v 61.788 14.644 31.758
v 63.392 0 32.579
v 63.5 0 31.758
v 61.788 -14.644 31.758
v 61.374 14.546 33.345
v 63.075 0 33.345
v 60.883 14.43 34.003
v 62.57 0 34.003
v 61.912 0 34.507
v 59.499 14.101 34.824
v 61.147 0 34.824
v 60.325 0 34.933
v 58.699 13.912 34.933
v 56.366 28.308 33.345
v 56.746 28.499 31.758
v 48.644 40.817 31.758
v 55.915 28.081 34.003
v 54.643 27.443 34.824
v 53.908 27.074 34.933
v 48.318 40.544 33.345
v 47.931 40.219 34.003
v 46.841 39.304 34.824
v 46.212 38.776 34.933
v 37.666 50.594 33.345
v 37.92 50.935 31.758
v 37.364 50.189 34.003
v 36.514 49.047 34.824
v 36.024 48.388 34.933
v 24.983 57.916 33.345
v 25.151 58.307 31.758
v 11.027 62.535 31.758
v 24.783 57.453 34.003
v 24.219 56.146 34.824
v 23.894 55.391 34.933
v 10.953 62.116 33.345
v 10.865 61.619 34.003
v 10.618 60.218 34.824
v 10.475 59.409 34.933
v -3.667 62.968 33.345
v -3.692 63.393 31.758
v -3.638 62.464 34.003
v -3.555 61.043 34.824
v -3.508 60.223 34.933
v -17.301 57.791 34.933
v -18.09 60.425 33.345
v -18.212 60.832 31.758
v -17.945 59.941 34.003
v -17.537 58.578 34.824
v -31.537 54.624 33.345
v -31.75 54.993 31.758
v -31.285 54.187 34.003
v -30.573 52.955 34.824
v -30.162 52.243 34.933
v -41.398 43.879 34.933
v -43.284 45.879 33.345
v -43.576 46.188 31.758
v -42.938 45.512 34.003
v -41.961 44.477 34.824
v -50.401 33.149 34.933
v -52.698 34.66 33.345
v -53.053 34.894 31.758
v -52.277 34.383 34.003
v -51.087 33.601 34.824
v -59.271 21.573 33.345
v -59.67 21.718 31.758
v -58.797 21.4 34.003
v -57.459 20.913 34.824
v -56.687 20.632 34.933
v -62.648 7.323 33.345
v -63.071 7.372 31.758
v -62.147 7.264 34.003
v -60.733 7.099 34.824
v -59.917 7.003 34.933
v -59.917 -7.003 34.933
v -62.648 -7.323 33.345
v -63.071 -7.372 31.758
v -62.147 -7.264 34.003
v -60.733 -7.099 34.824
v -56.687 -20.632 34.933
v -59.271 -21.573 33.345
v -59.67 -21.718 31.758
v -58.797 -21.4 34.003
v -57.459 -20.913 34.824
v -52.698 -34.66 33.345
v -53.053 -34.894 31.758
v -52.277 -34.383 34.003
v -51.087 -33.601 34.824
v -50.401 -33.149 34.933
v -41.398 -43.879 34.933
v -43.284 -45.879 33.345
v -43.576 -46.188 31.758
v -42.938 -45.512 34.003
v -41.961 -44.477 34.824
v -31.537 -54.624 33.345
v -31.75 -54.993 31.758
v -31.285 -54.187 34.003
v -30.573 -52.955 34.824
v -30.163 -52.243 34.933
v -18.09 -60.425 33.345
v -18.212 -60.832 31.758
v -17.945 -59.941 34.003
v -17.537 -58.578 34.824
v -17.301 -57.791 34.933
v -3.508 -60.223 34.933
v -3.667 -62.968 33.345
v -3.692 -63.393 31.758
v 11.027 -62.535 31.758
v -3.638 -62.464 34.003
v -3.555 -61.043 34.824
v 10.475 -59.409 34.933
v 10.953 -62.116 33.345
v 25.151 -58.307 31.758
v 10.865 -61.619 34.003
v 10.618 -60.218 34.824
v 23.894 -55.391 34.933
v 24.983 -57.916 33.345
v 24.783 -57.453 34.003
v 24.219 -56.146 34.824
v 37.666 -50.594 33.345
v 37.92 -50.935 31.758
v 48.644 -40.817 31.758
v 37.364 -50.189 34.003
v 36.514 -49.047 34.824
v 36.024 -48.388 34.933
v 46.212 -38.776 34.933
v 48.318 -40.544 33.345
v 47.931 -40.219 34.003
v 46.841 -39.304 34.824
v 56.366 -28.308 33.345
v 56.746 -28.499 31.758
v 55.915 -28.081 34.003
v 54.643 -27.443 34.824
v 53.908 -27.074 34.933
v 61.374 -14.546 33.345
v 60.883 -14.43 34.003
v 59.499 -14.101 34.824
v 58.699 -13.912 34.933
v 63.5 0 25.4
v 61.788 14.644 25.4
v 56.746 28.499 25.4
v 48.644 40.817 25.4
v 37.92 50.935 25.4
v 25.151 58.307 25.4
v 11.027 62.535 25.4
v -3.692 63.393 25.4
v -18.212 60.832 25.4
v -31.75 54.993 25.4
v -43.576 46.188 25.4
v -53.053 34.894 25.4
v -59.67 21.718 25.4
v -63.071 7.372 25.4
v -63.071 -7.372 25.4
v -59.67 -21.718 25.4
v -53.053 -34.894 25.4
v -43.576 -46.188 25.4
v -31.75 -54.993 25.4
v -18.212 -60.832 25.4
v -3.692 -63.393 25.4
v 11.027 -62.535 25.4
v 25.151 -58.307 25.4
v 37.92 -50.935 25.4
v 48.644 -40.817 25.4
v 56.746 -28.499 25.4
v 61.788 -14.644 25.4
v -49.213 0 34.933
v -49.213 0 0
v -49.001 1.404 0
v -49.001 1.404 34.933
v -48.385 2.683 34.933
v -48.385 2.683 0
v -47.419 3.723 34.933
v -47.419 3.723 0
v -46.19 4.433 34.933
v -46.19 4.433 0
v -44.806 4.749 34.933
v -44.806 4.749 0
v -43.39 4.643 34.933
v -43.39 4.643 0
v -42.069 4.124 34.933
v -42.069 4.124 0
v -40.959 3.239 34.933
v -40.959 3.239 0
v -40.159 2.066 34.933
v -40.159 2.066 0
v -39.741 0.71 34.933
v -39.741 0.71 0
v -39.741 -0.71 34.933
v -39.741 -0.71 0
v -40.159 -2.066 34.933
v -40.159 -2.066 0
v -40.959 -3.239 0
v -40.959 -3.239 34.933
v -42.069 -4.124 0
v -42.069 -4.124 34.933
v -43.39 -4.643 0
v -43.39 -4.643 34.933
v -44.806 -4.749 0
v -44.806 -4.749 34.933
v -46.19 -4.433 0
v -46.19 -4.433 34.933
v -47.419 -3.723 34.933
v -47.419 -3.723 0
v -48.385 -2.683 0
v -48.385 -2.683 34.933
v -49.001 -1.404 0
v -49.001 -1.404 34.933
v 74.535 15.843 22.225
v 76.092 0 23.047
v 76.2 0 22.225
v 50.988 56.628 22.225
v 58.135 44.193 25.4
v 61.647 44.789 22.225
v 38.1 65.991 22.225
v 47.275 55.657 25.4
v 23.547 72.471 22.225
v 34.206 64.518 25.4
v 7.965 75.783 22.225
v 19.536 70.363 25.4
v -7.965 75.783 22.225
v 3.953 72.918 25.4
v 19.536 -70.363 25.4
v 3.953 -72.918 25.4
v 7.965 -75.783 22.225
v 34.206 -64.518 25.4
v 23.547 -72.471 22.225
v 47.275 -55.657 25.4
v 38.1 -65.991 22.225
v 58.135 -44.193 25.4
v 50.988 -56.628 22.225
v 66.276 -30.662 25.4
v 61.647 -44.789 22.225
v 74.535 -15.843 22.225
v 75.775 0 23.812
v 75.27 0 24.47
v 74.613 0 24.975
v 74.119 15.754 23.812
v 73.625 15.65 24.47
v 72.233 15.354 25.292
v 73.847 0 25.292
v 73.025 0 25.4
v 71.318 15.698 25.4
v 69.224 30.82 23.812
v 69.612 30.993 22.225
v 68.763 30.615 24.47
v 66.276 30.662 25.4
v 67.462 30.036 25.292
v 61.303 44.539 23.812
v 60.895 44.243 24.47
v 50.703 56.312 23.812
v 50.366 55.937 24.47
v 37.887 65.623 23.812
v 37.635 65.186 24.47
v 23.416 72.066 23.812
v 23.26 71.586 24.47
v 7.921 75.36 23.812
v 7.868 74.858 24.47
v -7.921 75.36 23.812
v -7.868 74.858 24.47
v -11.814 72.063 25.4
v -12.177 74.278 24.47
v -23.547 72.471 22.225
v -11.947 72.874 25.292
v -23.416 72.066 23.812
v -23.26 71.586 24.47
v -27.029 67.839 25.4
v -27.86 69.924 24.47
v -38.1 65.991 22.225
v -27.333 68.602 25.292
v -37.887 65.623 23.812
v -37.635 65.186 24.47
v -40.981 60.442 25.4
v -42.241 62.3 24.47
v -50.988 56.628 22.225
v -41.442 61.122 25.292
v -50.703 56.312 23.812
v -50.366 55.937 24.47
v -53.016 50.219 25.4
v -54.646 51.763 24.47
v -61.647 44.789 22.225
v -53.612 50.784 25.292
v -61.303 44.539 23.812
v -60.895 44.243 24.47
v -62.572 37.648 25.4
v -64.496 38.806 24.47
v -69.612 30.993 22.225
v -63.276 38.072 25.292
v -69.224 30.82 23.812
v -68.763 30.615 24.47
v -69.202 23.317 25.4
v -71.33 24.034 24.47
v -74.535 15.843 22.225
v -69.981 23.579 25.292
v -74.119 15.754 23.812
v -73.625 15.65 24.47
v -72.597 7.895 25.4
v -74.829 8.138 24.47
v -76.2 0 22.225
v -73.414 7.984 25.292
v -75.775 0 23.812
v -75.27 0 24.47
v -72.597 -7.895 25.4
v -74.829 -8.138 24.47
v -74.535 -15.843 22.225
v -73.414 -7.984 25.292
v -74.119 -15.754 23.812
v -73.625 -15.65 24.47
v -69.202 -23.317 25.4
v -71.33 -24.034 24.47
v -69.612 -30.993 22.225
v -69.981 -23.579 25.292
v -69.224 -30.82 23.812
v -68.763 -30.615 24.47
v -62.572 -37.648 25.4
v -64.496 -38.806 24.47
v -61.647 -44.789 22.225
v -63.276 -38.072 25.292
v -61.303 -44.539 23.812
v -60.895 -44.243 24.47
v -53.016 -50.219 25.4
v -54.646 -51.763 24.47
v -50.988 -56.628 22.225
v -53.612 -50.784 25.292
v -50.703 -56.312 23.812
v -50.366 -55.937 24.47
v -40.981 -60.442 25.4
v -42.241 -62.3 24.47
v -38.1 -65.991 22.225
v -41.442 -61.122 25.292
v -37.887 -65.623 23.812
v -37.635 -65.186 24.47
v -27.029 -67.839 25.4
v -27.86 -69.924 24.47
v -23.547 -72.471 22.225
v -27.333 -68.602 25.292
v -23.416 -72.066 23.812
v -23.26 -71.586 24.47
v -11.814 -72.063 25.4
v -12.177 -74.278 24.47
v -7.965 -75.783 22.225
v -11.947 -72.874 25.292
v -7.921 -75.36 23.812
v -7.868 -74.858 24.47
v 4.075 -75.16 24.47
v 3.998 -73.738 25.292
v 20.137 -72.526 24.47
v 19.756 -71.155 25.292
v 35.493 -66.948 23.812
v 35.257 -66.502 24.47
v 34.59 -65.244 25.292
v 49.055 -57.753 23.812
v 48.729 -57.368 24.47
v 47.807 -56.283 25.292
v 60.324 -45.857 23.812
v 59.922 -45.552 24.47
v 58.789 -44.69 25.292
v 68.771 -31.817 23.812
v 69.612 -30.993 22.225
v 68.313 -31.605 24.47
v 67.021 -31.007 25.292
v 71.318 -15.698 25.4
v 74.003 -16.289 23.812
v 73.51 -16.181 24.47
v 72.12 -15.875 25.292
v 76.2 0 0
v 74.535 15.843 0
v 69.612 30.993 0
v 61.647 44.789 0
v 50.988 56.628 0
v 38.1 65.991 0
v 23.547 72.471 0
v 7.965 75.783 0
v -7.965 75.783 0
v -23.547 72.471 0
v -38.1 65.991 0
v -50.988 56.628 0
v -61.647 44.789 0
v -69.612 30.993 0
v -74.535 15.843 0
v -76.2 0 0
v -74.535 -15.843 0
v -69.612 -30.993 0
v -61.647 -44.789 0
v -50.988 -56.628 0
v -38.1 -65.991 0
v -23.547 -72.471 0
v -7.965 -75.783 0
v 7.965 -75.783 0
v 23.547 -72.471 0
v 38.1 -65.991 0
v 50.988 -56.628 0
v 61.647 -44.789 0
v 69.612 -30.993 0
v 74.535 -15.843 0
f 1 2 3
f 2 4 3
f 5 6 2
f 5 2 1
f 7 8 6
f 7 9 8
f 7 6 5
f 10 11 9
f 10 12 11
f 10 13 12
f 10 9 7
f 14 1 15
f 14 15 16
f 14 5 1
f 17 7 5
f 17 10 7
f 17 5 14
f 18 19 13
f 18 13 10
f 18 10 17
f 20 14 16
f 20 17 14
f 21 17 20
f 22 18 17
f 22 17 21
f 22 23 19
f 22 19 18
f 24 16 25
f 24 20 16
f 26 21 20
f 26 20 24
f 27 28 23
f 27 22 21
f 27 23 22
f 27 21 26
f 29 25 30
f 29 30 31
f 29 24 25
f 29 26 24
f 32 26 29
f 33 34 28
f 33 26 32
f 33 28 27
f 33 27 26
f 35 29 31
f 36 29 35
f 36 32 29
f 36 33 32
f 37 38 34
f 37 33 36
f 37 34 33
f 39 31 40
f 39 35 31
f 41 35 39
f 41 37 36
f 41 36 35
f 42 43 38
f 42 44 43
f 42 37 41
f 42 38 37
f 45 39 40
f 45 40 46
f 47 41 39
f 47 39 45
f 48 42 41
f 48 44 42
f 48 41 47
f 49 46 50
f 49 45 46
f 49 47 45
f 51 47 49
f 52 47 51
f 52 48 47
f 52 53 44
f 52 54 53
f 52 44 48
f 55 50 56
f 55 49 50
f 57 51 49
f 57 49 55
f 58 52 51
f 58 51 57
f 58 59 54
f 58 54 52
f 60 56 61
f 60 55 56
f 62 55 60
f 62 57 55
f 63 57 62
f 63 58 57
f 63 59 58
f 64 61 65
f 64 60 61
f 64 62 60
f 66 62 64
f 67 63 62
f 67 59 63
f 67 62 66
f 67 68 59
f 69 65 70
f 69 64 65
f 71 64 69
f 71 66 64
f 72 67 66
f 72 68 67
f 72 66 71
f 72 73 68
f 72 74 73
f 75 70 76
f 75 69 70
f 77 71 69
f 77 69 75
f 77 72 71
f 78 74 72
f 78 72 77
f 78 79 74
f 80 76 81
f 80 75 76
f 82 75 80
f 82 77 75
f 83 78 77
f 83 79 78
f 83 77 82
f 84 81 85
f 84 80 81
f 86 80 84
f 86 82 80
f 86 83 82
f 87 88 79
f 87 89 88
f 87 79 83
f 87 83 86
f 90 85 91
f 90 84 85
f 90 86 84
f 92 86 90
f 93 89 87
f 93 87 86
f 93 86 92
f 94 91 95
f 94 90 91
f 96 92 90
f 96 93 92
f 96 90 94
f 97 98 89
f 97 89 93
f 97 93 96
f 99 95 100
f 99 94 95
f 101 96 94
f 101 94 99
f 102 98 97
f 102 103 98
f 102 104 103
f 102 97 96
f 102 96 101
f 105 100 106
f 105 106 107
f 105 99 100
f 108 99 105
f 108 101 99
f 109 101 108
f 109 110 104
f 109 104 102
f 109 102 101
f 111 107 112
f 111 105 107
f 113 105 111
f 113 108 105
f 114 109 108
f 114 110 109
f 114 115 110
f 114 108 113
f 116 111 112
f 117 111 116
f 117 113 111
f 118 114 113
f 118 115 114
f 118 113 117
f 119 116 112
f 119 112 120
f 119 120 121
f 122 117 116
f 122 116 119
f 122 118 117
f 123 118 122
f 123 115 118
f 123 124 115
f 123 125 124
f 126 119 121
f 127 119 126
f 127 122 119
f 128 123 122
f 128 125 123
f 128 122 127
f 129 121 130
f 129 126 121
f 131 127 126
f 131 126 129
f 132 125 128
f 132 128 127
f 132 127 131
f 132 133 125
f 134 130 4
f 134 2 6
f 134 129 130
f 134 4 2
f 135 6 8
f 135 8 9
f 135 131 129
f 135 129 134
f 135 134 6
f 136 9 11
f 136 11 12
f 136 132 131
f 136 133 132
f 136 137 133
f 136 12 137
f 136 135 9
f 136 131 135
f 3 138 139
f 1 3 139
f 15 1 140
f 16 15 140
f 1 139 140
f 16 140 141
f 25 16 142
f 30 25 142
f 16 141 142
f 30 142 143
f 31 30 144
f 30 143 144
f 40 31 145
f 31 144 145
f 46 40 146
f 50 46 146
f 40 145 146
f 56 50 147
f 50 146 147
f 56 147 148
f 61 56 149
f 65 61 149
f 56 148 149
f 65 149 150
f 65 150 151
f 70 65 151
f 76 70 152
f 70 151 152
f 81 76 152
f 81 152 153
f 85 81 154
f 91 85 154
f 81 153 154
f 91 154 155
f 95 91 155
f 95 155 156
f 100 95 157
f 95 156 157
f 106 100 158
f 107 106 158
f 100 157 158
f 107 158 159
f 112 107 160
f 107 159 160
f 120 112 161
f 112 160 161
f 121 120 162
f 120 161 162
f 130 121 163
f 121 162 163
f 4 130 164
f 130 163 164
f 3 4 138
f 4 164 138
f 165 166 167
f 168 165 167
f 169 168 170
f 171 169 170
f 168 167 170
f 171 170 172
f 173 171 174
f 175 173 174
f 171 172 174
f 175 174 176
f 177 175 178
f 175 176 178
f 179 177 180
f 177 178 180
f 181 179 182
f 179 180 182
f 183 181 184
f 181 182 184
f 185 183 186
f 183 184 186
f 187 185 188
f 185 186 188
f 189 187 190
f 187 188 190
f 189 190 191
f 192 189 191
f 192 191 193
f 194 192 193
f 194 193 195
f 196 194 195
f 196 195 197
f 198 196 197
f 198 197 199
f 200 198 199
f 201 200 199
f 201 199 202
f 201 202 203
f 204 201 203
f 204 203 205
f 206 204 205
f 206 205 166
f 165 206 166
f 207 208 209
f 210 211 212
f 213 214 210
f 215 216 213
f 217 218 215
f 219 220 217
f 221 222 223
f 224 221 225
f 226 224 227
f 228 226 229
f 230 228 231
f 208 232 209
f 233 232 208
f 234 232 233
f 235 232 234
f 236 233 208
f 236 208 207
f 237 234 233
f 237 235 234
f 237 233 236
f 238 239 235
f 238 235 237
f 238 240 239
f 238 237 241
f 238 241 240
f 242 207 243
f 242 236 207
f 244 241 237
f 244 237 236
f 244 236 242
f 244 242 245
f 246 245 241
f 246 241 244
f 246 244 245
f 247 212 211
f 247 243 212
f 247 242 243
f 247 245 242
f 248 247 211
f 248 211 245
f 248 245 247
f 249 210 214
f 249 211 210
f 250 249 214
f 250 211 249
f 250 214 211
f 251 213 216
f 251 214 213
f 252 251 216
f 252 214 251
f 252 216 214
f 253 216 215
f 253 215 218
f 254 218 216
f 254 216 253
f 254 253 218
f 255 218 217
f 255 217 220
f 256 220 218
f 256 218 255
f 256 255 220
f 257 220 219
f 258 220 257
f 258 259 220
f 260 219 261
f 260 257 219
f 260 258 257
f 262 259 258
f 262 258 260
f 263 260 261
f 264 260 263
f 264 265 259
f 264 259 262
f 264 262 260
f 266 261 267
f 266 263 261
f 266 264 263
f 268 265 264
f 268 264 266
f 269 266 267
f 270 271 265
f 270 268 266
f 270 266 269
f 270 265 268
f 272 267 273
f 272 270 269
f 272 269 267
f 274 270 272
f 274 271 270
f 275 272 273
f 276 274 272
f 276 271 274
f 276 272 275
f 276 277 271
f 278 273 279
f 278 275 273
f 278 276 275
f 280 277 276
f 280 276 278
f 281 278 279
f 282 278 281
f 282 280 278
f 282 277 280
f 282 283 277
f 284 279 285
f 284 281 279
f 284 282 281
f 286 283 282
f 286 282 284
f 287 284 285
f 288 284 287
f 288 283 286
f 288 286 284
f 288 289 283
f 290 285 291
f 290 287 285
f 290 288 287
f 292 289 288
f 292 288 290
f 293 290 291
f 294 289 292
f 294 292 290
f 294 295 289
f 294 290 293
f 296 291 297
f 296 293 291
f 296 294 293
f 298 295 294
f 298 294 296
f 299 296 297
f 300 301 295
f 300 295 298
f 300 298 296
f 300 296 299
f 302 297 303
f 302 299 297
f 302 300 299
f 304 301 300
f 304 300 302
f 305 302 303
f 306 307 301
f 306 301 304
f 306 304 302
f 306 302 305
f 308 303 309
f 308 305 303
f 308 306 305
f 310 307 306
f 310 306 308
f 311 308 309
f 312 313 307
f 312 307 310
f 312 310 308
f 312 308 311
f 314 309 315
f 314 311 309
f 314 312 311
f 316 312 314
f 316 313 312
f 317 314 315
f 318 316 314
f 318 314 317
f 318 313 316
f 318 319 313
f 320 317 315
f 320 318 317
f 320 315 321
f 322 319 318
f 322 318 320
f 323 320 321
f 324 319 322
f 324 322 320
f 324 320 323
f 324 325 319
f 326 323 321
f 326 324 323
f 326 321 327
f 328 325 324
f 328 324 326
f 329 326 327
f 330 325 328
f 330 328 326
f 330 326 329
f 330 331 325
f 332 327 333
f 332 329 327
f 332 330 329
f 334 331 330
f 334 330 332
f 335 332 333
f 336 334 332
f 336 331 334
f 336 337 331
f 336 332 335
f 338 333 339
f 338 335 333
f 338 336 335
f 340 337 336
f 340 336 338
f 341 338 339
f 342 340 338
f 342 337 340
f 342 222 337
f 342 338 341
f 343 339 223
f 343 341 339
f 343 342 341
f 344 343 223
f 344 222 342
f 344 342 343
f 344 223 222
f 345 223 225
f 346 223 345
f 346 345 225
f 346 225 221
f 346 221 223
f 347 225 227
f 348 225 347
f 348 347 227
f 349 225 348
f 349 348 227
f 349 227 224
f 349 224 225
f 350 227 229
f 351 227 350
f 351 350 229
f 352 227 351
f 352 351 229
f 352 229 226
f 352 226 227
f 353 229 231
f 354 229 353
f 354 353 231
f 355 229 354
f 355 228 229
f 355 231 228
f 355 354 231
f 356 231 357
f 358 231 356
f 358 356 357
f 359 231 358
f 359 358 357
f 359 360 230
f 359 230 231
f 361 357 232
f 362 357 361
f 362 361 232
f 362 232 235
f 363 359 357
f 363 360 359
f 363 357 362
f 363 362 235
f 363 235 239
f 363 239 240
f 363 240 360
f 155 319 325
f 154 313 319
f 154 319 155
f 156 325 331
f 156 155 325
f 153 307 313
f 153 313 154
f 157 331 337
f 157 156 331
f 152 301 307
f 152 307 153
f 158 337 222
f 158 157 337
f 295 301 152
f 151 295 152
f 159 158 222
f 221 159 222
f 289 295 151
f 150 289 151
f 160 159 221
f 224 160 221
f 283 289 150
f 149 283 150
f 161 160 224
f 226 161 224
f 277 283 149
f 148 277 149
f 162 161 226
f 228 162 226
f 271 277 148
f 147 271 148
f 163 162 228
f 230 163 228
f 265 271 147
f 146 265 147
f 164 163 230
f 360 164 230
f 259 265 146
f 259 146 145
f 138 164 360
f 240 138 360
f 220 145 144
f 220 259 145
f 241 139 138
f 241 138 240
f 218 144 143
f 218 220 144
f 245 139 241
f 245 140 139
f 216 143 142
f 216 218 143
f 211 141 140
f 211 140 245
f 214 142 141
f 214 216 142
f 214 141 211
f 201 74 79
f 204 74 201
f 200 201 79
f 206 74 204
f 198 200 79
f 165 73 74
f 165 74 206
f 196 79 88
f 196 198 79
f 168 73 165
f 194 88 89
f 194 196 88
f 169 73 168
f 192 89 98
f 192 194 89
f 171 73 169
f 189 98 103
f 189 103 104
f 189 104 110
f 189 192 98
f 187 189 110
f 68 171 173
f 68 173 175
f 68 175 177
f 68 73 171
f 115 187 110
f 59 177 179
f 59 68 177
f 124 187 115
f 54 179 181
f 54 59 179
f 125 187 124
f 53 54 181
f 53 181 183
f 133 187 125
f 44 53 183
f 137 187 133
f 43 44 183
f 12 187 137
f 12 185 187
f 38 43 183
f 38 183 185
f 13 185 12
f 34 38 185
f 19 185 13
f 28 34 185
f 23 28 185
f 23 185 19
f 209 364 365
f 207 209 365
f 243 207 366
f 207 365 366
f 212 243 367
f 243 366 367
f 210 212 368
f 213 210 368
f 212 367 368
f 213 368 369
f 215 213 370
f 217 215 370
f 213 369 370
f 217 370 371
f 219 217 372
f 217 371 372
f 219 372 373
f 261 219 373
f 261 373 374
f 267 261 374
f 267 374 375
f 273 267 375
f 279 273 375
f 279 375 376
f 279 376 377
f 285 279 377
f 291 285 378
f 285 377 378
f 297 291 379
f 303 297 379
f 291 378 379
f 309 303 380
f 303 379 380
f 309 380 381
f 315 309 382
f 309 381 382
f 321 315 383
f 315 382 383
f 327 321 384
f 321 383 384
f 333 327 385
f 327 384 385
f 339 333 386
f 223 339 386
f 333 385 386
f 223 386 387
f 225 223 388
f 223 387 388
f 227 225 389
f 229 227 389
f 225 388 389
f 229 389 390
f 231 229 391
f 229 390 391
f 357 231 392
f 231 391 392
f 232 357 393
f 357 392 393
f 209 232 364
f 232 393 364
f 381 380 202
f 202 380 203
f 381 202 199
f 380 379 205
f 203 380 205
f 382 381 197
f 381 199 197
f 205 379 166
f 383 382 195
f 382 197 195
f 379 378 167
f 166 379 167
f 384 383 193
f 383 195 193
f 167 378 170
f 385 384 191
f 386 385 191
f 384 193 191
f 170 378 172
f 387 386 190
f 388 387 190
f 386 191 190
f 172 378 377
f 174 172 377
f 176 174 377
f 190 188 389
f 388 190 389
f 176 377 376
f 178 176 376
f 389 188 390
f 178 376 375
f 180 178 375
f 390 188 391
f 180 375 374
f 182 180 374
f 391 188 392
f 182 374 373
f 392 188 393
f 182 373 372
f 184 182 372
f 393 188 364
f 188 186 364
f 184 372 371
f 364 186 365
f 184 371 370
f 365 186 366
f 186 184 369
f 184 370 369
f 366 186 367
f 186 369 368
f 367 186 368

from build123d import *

# Parameters (mm, degrees)
F0_R     = 76.2
F1_DEPTH = 25.4
F2_R     = 63.5
F3_DEPTH = 9.53262
F4_R     = 3.175
F6_D     = 9.525


with BuildPart() as f1:
    # F0 (on Top) → F1 (new body)
    with BuildSketch(Plane.XY):
        Circle(F0_R)
    extrude(amount=F1_DEPTH)

    # F2 (on face) → F3 (join)
    with BuildSketch(Plane.XY.offset(25.4)):
        Circle(F2_R)
    extrude(amount=F3_DEPTH)

    # F4
    f4_edges = [f1.edges().sort_by_distance(p)[0] for p in [
        (-76.2, 0, 25.4),
        (-63.5, 0, 34.93262),
    ]]
    fillet(f4_edges, radius=F4_R)

    # F6 (through all)
    with Locations(Plane.XY.offset(34.93262)):
        with Locations((-44.45, 0)):
            Hole(F6_D / 2)


solid = f1.part
